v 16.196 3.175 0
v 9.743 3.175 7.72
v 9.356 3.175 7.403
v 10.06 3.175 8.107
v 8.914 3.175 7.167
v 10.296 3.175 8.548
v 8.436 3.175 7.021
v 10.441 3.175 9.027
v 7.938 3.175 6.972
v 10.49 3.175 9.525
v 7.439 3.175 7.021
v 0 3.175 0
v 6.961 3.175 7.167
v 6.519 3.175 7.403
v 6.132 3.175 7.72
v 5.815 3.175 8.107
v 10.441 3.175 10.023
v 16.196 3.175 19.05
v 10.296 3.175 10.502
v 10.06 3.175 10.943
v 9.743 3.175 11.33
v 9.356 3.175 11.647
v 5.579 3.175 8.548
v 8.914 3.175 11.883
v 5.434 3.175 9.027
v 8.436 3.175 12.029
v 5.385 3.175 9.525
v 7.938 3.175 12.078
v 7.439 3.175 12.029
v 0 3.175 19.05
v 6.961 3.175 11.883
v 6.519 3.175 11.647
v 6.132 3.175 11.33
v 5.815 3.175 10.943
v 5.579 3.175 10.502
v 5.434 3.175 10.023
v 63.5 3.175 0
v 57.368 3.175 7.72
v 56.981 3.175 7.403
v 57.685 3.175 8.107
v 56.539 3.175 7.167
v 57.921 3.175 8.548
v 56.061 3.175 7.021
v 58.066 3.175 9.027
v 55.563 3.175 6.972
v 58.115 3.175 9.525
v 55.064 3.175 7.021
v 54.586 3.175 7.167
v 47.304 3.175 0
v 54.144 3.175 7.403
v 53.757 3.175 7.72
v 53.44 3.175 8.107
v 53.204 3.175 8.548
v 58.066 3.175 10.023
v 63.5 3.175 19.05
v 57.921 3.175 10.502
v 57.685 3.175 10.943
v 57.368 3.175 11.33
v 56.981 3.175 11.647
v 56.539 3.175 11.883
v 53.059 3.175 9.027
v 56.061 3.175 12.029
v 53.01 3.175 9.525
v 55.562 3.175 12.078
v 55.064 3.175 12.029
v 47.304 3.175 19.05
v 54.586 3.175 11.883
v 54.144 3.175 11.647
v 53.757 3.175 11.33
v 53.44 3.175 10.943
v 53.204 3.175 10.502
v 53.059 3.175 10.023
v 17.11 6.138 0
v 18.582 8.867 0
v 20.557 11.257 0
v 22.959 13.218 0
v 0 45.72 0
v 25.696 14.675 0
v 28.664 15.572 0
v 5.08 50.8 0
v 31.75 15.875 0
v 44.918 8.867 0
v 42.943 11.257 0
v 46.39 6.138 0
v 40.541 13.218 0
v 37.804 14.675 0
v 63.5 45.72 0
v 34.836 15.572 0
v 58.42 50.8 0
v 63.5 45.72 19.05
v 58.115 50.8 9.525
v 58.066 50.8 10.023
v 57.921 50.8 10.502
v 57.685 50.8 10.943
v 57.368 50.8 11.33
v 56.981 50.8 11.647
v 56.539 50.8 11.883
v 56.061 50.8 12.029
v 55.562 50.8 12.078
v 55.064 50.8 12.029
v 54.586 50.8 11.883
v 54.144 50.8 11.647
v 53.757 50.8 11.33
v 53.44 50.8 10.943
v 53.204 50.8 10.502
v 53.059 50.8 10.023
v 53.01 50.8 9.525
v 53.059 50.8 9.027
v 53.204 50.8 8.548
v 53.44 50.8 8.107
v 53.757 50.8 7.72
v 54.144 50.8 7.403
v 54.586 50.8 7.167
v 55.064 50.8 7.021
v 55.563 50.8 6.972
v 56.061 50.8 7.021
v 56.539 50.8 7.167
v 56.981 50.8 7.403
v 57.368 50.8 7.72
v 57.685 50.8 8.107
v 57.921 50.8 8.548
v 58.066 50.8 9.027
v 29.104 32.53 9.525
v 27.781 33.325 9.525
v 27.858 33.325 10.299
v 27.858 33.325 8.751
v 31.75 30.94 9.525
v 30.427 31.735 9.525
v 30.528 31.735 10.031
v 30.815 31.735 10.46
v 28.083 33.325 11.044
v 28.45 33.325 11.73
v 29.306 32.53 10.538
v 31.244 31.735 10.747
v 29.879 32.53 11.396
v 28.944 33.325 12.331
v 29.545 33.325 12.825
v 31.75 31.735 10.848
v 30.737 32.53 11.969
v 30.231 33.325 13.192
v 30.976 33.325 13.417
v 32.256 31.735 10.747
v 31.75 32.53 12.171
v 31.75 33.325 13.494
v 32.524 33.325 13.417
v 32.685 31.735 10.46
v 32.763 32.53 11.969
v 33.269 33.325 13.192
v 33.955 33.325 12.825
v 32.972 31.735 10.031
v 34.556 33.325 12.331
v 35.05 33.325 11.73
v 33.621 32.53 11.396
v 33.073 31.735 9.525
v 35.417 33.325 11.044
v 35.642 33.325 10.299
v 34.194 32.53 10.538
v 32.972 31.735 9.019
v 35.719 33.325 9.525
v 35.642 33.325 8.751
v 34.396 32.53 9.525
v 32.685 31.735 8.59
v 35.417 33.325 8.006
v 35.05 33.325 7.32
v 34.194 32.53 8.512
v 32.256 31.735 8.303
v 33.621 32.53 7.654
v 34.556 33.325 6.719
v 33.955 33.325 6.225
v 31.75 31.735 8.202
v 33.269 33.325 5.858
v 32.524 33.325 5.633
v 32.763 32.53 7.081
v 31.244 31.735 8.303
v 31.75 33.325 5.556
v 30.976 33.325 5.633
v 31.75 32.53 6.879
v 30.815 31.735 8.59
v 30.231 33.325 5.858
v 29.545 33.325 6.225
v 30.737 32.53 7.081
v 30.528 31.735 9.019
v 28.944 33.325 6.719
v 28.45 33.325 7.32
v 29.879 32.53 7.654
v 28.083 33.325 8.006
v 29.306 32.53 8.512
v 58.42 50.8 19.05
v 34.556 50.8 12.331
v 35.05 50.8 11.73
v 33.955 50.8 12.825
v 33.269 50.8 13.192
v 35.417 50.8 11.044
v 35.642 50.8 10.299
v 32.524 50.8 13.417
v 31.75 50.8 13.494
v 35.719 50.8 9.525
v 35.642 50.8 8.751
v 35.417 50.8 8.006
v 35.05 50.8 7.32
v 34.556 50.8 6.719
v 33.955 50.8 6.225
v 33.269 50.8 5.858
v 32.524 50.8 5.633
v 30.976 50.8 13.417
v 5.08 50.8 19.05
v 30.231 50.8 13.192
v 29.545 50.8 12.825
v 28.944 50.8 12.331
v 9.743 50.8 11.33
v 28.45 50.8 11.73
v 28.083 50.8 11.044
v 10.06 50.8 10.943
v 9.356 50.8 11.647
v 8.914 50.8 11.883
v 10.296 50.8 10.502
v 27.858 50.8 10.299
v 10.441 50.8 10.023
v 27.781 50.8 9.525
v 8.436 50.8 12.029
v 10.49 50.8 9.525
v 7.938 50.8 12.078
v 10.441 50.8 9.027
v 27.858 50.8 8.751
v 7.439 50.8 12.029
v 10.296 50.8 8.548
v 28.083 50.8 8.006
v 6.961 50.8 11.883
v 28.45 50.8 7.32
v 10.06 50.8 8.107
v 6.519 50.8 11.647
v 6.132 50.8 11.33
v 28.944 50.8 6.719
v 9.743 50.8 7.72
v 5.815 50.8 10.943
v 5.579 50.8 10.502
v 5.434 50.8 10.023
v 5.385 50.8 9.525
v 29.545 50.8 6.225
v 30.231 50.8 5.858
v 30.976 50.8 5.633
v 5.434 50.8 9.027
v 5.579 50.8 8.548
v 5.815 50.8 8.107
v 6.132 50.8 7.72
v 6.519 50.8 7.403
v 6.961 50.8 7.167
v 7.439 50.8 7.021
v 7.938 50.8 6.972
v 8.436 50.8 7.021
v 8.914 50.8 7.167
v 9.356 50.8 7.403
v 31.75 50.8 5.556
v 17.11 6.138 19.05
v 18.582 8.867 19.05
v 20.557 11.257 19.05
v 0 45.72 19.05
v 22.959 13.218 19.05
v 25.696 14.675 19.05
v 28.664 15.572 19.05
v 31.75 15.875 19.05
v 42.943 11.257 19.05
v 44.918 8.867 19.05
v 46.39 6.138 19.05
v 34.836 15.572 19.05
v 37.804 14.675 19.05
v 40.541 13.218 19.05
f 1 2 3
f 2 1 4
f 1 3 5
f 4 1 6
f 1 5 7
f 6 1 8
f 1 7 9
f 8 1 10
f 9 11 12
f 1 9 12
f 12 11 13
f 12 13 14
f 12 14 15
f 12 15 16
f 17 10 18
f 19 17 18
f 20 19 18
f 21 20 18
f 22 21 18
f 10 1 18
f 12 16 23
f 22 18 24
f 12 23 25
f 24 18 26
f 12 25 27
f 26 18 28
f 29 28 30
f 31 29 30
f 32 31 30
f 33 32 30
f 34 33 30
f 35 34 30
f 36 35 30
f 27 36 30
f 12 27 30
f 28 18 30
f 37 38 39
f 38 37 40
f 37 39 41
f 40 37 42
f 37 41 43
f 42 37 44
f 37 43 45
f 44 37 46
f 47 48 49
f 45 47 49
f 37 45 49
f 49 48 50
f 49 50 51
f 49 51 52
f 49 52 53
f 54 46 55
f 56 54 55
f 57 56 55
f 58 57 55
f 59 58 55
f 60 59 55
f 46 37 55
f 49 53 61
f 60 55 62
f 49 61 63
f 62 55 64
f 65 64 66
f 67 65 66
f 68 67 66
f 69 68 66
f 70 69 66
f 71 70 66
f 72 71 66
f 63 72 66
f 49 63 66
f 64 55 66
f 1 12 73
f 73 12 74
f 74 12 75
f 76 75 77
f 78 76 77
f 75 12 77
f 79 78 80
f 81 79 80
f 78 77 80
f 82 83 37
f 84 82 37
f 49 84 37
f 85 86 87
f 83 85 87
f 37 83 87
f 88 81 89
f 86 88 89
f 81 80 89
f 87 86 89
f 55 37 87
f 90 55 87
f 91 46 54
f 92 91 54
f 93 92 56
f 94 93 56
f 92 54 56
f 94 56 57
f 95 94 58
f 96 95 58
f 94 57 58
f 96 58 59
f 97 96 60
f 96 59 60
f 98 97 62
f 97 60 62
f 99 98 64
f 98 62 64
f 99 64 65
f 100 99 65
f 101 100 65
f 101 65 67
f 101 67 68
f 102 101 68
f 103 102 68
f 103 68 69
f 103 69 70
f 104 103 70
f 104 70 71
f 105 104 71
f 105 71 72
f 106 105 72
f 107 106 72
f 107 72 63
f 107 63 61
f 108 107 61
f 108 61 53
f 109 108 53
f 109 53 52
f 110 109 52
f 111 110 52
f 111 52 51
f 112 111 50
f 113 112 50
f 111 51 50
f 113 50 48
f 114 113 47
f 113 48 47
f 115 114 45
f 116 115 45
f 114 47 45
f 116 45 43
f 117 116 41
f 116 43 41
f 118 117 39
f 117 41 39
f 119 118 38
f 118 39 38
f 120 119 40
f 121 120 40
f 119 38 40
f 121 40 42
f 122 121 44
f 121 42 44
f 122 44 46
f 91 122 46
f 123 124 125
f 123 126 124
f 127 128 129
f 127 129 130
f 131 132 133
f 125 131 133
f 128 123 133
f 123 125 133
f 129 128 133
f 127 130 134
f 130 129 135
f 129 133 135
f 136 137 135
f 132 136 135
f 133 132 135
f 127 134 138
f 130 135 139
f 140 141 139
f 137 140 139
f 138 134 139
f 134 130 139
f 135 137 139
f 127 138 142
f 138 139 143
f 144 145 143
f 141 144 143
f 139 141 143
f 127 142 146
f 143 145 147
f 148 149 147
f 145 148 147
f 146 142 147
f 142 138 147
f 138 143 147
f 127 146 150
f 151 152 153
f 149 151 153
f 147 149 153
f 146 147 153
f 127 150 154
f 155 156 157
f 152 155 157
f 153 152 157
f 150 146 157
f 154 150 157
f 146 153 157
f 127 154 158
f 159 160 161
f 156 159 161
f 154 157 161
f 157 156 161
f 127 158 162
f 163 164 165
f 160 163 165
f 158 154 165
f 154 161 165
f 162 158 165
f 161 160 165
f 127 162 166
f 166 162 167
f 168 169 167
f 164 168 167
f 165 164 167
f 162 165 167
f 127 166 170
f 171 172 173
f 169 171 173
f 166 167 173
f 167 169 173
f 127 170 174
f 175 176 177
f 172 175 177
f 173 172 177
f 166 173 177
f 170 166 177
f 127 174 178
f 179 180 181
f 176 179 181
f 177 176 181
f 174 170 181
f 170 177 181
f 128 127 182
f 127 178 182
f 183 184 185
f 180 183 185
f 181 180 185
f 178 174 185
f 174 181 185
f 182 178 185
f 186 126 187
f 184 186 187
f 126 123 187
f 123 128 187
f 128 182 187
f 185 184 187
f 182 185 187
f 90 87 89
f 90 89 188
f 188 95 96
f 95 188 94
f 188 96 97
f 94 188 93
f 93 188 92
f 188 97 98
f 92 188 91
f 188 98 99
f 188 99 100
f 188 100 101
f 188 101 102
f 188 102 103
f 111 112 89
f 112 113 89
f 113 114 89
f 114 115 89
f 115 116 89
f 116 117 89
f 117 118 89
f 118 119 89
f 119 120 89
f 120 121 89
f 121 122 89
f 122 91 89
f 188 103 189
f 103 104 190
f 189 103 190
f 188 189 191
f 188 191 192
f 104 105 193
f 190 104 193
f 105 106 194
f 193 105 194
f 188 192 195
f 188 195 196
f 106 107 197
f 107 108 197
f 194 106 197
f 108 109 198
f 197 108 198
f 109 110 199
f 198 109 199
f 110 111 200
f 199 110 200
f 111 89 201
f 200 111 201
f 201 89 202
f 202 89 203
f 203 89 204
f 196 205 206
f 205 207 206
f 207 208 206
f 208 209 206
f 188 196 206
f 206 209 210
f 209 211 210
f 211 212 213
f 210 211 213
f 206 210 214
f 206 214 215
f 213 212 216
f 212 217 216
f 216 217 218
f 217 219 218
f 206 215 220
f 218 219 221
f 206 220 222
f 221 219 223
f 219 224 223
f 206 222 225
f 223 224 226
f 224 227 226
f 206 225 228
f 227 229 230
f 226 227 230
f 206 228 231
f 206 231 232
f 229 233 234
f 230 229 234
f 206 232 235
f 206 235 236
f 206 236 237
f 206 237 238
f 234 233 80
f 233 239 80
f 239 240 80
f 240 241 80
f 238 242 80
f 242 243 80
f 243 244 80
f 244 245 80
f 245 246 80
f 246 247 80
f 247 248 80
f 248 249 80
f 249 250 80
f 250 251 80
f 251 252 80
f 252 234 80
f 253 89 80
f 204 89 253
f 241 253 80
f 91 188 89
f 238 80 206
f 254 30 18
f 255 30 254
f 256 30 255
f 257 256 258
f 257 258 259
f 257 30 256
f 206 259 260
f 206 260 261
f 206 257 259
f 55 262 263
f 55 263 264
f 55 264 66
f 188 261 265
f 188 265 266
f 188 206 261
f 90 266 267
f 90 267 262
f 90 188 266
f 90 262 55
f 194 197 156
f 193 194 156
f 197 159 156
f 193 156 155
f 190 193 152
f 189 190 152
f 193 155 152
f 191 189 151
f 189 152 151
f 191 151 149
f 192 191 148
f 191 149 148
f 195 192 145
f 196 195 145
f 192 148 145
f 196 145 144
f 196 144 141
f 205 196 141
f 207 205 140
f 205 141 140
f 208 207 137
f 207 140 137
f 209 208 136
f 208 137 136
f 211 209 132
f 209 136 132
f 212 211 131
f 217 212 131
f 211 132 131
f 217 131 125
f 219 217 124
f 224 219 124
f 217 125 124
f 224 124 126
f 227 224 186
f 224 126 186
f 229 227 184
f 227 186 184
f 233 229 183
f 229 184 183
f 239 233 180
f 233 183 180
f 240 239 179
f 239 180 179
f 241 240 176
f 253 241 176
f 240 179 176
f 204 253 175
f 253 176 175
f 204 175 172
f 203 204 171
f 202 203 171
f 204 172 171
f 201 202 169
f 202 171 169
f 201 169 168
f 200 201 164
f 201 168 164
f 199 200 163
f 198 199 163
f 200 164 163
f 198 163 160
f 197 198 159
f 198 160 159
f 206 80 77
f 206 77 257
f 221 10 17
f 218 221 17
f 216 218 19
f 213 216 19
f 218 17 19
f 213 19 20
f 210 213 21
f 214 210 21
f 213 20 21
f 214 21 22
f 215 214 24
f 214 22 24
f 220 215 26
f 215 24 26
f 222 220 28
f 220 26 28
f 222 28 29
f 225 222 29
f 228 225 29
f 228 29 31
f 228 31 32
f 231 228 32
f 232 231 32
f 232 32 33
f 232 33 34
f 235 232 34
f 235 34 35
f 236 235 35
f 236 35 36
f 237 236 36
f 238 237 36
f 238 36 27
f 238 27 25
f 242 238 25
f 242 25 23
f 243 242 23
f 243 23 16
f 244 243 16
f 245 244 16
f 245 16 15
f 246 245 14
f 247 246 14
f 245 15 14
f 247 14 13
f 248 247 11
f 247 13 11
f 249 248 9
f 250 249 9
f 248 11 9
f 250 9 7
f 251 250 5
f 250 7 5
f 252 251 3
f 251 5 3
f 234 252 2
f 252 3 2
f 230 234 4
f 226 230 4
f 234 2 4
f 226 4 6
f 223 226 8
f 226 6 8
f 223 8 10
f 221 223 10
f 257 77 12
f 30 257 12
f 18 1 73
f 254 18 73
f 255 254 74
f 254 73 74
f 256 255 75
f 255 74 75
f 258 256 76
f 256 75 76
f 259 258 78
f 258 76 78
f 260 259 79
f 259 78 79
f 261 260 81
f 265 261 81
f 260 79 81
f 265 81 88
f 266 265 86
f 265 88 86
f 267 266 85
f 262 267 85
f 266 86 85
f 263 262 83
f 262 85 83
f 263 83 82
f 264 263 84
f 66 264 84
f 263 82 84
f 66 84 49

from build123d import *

# Parameters (mm, degrees)
F1_DEPTH = 19.05
F3_D     = 5.1054
F4_SIZE  = 5.08
F6_DEPTH = 25.4
F8_D     = 7.9375
F8_DEPTH = 17.4752
F8_TIP   = 2.3846655818


with BuildPart() as f1:
    # F0 (on Top) → F1 (new body)
    with BuildSketch(Plane.XY):
        with BuildLine():
            Line((0, 50.8), (0, 0))
            Line((0, 0), (15.875, 0))
            ThreePointArc((15.875, 0), (31.75, 15.875), (47.625, 0))
            Line((47.625, 0), (63.5, 0))
            Line((63.5, 0), (63.5, 50.8))
            Line((63.5, 50.8), (0, 50.8))
        make_face()
    extrude(amount=F1_DEPTH)

    # F3 (through all)
    with Locations(Plane(origin=(0, 50.8, 0), x_dir=(-1, 0, 0), z_dir=(0, 1, 0))):
        with Locations((-55.5625, 9.525), (-7.9375, 9.525)):
            Hole(F3_D / 2)

    # F4
    f4_edges = [f1.edges().sort_by_distance(p)[0] for p in [
        (63.5, 50.8, 9.525),
        (0, 50.8, 9.525),
    ]]
    chamfer(f4_edges, length=F4_SIZE)

    # F5 (on face) → F6 (cut)
    with BuildSketch(Plane.XY.offset(19.05)):
        with BuildLine():
            Line((0, 3.175), (0, 0))
            Line((0, 0), (15.875, 0))
            ThreePointArc((15.875, 0), (15.955388571, 1.5955797718), (16.1957401333, 3.175))
            Line((16.1957401333, 3.175), (0, 3.175))
        make_face()
        with BuildLine():
            ThreePointArc((47.3042598667, 3.175), (47.544611429, 1.5955797718), (47.625, 0))
            Line((47.625, 0), (63.5, 0))
            Line((63.5, 0), (63.5, 3.175))
            Line((63.5, 3.175), (47.3042598667, 3.175))
        make_face()
    extrude(amount=-F6_DEPTH, mode=Mode.SUBTRACT)

    # F8
    with Locations(Plane(origin=(0, 50.8, 0), x_dir=(-1, 0, 0), z_dir=(0, 1, 0))):
        with Locations((-31.75, 9.525)):
            Hole(F8_D / 2, depth=F8_DEPTH)
            with Locations((0, 0, -(F8_DEPTH + F8_TIP / 2))):  # 118° drill point
                Cone(0, F8_D / 2, F8_TIP, mode=Mode.SUBTRACT)


solid = f1.part
